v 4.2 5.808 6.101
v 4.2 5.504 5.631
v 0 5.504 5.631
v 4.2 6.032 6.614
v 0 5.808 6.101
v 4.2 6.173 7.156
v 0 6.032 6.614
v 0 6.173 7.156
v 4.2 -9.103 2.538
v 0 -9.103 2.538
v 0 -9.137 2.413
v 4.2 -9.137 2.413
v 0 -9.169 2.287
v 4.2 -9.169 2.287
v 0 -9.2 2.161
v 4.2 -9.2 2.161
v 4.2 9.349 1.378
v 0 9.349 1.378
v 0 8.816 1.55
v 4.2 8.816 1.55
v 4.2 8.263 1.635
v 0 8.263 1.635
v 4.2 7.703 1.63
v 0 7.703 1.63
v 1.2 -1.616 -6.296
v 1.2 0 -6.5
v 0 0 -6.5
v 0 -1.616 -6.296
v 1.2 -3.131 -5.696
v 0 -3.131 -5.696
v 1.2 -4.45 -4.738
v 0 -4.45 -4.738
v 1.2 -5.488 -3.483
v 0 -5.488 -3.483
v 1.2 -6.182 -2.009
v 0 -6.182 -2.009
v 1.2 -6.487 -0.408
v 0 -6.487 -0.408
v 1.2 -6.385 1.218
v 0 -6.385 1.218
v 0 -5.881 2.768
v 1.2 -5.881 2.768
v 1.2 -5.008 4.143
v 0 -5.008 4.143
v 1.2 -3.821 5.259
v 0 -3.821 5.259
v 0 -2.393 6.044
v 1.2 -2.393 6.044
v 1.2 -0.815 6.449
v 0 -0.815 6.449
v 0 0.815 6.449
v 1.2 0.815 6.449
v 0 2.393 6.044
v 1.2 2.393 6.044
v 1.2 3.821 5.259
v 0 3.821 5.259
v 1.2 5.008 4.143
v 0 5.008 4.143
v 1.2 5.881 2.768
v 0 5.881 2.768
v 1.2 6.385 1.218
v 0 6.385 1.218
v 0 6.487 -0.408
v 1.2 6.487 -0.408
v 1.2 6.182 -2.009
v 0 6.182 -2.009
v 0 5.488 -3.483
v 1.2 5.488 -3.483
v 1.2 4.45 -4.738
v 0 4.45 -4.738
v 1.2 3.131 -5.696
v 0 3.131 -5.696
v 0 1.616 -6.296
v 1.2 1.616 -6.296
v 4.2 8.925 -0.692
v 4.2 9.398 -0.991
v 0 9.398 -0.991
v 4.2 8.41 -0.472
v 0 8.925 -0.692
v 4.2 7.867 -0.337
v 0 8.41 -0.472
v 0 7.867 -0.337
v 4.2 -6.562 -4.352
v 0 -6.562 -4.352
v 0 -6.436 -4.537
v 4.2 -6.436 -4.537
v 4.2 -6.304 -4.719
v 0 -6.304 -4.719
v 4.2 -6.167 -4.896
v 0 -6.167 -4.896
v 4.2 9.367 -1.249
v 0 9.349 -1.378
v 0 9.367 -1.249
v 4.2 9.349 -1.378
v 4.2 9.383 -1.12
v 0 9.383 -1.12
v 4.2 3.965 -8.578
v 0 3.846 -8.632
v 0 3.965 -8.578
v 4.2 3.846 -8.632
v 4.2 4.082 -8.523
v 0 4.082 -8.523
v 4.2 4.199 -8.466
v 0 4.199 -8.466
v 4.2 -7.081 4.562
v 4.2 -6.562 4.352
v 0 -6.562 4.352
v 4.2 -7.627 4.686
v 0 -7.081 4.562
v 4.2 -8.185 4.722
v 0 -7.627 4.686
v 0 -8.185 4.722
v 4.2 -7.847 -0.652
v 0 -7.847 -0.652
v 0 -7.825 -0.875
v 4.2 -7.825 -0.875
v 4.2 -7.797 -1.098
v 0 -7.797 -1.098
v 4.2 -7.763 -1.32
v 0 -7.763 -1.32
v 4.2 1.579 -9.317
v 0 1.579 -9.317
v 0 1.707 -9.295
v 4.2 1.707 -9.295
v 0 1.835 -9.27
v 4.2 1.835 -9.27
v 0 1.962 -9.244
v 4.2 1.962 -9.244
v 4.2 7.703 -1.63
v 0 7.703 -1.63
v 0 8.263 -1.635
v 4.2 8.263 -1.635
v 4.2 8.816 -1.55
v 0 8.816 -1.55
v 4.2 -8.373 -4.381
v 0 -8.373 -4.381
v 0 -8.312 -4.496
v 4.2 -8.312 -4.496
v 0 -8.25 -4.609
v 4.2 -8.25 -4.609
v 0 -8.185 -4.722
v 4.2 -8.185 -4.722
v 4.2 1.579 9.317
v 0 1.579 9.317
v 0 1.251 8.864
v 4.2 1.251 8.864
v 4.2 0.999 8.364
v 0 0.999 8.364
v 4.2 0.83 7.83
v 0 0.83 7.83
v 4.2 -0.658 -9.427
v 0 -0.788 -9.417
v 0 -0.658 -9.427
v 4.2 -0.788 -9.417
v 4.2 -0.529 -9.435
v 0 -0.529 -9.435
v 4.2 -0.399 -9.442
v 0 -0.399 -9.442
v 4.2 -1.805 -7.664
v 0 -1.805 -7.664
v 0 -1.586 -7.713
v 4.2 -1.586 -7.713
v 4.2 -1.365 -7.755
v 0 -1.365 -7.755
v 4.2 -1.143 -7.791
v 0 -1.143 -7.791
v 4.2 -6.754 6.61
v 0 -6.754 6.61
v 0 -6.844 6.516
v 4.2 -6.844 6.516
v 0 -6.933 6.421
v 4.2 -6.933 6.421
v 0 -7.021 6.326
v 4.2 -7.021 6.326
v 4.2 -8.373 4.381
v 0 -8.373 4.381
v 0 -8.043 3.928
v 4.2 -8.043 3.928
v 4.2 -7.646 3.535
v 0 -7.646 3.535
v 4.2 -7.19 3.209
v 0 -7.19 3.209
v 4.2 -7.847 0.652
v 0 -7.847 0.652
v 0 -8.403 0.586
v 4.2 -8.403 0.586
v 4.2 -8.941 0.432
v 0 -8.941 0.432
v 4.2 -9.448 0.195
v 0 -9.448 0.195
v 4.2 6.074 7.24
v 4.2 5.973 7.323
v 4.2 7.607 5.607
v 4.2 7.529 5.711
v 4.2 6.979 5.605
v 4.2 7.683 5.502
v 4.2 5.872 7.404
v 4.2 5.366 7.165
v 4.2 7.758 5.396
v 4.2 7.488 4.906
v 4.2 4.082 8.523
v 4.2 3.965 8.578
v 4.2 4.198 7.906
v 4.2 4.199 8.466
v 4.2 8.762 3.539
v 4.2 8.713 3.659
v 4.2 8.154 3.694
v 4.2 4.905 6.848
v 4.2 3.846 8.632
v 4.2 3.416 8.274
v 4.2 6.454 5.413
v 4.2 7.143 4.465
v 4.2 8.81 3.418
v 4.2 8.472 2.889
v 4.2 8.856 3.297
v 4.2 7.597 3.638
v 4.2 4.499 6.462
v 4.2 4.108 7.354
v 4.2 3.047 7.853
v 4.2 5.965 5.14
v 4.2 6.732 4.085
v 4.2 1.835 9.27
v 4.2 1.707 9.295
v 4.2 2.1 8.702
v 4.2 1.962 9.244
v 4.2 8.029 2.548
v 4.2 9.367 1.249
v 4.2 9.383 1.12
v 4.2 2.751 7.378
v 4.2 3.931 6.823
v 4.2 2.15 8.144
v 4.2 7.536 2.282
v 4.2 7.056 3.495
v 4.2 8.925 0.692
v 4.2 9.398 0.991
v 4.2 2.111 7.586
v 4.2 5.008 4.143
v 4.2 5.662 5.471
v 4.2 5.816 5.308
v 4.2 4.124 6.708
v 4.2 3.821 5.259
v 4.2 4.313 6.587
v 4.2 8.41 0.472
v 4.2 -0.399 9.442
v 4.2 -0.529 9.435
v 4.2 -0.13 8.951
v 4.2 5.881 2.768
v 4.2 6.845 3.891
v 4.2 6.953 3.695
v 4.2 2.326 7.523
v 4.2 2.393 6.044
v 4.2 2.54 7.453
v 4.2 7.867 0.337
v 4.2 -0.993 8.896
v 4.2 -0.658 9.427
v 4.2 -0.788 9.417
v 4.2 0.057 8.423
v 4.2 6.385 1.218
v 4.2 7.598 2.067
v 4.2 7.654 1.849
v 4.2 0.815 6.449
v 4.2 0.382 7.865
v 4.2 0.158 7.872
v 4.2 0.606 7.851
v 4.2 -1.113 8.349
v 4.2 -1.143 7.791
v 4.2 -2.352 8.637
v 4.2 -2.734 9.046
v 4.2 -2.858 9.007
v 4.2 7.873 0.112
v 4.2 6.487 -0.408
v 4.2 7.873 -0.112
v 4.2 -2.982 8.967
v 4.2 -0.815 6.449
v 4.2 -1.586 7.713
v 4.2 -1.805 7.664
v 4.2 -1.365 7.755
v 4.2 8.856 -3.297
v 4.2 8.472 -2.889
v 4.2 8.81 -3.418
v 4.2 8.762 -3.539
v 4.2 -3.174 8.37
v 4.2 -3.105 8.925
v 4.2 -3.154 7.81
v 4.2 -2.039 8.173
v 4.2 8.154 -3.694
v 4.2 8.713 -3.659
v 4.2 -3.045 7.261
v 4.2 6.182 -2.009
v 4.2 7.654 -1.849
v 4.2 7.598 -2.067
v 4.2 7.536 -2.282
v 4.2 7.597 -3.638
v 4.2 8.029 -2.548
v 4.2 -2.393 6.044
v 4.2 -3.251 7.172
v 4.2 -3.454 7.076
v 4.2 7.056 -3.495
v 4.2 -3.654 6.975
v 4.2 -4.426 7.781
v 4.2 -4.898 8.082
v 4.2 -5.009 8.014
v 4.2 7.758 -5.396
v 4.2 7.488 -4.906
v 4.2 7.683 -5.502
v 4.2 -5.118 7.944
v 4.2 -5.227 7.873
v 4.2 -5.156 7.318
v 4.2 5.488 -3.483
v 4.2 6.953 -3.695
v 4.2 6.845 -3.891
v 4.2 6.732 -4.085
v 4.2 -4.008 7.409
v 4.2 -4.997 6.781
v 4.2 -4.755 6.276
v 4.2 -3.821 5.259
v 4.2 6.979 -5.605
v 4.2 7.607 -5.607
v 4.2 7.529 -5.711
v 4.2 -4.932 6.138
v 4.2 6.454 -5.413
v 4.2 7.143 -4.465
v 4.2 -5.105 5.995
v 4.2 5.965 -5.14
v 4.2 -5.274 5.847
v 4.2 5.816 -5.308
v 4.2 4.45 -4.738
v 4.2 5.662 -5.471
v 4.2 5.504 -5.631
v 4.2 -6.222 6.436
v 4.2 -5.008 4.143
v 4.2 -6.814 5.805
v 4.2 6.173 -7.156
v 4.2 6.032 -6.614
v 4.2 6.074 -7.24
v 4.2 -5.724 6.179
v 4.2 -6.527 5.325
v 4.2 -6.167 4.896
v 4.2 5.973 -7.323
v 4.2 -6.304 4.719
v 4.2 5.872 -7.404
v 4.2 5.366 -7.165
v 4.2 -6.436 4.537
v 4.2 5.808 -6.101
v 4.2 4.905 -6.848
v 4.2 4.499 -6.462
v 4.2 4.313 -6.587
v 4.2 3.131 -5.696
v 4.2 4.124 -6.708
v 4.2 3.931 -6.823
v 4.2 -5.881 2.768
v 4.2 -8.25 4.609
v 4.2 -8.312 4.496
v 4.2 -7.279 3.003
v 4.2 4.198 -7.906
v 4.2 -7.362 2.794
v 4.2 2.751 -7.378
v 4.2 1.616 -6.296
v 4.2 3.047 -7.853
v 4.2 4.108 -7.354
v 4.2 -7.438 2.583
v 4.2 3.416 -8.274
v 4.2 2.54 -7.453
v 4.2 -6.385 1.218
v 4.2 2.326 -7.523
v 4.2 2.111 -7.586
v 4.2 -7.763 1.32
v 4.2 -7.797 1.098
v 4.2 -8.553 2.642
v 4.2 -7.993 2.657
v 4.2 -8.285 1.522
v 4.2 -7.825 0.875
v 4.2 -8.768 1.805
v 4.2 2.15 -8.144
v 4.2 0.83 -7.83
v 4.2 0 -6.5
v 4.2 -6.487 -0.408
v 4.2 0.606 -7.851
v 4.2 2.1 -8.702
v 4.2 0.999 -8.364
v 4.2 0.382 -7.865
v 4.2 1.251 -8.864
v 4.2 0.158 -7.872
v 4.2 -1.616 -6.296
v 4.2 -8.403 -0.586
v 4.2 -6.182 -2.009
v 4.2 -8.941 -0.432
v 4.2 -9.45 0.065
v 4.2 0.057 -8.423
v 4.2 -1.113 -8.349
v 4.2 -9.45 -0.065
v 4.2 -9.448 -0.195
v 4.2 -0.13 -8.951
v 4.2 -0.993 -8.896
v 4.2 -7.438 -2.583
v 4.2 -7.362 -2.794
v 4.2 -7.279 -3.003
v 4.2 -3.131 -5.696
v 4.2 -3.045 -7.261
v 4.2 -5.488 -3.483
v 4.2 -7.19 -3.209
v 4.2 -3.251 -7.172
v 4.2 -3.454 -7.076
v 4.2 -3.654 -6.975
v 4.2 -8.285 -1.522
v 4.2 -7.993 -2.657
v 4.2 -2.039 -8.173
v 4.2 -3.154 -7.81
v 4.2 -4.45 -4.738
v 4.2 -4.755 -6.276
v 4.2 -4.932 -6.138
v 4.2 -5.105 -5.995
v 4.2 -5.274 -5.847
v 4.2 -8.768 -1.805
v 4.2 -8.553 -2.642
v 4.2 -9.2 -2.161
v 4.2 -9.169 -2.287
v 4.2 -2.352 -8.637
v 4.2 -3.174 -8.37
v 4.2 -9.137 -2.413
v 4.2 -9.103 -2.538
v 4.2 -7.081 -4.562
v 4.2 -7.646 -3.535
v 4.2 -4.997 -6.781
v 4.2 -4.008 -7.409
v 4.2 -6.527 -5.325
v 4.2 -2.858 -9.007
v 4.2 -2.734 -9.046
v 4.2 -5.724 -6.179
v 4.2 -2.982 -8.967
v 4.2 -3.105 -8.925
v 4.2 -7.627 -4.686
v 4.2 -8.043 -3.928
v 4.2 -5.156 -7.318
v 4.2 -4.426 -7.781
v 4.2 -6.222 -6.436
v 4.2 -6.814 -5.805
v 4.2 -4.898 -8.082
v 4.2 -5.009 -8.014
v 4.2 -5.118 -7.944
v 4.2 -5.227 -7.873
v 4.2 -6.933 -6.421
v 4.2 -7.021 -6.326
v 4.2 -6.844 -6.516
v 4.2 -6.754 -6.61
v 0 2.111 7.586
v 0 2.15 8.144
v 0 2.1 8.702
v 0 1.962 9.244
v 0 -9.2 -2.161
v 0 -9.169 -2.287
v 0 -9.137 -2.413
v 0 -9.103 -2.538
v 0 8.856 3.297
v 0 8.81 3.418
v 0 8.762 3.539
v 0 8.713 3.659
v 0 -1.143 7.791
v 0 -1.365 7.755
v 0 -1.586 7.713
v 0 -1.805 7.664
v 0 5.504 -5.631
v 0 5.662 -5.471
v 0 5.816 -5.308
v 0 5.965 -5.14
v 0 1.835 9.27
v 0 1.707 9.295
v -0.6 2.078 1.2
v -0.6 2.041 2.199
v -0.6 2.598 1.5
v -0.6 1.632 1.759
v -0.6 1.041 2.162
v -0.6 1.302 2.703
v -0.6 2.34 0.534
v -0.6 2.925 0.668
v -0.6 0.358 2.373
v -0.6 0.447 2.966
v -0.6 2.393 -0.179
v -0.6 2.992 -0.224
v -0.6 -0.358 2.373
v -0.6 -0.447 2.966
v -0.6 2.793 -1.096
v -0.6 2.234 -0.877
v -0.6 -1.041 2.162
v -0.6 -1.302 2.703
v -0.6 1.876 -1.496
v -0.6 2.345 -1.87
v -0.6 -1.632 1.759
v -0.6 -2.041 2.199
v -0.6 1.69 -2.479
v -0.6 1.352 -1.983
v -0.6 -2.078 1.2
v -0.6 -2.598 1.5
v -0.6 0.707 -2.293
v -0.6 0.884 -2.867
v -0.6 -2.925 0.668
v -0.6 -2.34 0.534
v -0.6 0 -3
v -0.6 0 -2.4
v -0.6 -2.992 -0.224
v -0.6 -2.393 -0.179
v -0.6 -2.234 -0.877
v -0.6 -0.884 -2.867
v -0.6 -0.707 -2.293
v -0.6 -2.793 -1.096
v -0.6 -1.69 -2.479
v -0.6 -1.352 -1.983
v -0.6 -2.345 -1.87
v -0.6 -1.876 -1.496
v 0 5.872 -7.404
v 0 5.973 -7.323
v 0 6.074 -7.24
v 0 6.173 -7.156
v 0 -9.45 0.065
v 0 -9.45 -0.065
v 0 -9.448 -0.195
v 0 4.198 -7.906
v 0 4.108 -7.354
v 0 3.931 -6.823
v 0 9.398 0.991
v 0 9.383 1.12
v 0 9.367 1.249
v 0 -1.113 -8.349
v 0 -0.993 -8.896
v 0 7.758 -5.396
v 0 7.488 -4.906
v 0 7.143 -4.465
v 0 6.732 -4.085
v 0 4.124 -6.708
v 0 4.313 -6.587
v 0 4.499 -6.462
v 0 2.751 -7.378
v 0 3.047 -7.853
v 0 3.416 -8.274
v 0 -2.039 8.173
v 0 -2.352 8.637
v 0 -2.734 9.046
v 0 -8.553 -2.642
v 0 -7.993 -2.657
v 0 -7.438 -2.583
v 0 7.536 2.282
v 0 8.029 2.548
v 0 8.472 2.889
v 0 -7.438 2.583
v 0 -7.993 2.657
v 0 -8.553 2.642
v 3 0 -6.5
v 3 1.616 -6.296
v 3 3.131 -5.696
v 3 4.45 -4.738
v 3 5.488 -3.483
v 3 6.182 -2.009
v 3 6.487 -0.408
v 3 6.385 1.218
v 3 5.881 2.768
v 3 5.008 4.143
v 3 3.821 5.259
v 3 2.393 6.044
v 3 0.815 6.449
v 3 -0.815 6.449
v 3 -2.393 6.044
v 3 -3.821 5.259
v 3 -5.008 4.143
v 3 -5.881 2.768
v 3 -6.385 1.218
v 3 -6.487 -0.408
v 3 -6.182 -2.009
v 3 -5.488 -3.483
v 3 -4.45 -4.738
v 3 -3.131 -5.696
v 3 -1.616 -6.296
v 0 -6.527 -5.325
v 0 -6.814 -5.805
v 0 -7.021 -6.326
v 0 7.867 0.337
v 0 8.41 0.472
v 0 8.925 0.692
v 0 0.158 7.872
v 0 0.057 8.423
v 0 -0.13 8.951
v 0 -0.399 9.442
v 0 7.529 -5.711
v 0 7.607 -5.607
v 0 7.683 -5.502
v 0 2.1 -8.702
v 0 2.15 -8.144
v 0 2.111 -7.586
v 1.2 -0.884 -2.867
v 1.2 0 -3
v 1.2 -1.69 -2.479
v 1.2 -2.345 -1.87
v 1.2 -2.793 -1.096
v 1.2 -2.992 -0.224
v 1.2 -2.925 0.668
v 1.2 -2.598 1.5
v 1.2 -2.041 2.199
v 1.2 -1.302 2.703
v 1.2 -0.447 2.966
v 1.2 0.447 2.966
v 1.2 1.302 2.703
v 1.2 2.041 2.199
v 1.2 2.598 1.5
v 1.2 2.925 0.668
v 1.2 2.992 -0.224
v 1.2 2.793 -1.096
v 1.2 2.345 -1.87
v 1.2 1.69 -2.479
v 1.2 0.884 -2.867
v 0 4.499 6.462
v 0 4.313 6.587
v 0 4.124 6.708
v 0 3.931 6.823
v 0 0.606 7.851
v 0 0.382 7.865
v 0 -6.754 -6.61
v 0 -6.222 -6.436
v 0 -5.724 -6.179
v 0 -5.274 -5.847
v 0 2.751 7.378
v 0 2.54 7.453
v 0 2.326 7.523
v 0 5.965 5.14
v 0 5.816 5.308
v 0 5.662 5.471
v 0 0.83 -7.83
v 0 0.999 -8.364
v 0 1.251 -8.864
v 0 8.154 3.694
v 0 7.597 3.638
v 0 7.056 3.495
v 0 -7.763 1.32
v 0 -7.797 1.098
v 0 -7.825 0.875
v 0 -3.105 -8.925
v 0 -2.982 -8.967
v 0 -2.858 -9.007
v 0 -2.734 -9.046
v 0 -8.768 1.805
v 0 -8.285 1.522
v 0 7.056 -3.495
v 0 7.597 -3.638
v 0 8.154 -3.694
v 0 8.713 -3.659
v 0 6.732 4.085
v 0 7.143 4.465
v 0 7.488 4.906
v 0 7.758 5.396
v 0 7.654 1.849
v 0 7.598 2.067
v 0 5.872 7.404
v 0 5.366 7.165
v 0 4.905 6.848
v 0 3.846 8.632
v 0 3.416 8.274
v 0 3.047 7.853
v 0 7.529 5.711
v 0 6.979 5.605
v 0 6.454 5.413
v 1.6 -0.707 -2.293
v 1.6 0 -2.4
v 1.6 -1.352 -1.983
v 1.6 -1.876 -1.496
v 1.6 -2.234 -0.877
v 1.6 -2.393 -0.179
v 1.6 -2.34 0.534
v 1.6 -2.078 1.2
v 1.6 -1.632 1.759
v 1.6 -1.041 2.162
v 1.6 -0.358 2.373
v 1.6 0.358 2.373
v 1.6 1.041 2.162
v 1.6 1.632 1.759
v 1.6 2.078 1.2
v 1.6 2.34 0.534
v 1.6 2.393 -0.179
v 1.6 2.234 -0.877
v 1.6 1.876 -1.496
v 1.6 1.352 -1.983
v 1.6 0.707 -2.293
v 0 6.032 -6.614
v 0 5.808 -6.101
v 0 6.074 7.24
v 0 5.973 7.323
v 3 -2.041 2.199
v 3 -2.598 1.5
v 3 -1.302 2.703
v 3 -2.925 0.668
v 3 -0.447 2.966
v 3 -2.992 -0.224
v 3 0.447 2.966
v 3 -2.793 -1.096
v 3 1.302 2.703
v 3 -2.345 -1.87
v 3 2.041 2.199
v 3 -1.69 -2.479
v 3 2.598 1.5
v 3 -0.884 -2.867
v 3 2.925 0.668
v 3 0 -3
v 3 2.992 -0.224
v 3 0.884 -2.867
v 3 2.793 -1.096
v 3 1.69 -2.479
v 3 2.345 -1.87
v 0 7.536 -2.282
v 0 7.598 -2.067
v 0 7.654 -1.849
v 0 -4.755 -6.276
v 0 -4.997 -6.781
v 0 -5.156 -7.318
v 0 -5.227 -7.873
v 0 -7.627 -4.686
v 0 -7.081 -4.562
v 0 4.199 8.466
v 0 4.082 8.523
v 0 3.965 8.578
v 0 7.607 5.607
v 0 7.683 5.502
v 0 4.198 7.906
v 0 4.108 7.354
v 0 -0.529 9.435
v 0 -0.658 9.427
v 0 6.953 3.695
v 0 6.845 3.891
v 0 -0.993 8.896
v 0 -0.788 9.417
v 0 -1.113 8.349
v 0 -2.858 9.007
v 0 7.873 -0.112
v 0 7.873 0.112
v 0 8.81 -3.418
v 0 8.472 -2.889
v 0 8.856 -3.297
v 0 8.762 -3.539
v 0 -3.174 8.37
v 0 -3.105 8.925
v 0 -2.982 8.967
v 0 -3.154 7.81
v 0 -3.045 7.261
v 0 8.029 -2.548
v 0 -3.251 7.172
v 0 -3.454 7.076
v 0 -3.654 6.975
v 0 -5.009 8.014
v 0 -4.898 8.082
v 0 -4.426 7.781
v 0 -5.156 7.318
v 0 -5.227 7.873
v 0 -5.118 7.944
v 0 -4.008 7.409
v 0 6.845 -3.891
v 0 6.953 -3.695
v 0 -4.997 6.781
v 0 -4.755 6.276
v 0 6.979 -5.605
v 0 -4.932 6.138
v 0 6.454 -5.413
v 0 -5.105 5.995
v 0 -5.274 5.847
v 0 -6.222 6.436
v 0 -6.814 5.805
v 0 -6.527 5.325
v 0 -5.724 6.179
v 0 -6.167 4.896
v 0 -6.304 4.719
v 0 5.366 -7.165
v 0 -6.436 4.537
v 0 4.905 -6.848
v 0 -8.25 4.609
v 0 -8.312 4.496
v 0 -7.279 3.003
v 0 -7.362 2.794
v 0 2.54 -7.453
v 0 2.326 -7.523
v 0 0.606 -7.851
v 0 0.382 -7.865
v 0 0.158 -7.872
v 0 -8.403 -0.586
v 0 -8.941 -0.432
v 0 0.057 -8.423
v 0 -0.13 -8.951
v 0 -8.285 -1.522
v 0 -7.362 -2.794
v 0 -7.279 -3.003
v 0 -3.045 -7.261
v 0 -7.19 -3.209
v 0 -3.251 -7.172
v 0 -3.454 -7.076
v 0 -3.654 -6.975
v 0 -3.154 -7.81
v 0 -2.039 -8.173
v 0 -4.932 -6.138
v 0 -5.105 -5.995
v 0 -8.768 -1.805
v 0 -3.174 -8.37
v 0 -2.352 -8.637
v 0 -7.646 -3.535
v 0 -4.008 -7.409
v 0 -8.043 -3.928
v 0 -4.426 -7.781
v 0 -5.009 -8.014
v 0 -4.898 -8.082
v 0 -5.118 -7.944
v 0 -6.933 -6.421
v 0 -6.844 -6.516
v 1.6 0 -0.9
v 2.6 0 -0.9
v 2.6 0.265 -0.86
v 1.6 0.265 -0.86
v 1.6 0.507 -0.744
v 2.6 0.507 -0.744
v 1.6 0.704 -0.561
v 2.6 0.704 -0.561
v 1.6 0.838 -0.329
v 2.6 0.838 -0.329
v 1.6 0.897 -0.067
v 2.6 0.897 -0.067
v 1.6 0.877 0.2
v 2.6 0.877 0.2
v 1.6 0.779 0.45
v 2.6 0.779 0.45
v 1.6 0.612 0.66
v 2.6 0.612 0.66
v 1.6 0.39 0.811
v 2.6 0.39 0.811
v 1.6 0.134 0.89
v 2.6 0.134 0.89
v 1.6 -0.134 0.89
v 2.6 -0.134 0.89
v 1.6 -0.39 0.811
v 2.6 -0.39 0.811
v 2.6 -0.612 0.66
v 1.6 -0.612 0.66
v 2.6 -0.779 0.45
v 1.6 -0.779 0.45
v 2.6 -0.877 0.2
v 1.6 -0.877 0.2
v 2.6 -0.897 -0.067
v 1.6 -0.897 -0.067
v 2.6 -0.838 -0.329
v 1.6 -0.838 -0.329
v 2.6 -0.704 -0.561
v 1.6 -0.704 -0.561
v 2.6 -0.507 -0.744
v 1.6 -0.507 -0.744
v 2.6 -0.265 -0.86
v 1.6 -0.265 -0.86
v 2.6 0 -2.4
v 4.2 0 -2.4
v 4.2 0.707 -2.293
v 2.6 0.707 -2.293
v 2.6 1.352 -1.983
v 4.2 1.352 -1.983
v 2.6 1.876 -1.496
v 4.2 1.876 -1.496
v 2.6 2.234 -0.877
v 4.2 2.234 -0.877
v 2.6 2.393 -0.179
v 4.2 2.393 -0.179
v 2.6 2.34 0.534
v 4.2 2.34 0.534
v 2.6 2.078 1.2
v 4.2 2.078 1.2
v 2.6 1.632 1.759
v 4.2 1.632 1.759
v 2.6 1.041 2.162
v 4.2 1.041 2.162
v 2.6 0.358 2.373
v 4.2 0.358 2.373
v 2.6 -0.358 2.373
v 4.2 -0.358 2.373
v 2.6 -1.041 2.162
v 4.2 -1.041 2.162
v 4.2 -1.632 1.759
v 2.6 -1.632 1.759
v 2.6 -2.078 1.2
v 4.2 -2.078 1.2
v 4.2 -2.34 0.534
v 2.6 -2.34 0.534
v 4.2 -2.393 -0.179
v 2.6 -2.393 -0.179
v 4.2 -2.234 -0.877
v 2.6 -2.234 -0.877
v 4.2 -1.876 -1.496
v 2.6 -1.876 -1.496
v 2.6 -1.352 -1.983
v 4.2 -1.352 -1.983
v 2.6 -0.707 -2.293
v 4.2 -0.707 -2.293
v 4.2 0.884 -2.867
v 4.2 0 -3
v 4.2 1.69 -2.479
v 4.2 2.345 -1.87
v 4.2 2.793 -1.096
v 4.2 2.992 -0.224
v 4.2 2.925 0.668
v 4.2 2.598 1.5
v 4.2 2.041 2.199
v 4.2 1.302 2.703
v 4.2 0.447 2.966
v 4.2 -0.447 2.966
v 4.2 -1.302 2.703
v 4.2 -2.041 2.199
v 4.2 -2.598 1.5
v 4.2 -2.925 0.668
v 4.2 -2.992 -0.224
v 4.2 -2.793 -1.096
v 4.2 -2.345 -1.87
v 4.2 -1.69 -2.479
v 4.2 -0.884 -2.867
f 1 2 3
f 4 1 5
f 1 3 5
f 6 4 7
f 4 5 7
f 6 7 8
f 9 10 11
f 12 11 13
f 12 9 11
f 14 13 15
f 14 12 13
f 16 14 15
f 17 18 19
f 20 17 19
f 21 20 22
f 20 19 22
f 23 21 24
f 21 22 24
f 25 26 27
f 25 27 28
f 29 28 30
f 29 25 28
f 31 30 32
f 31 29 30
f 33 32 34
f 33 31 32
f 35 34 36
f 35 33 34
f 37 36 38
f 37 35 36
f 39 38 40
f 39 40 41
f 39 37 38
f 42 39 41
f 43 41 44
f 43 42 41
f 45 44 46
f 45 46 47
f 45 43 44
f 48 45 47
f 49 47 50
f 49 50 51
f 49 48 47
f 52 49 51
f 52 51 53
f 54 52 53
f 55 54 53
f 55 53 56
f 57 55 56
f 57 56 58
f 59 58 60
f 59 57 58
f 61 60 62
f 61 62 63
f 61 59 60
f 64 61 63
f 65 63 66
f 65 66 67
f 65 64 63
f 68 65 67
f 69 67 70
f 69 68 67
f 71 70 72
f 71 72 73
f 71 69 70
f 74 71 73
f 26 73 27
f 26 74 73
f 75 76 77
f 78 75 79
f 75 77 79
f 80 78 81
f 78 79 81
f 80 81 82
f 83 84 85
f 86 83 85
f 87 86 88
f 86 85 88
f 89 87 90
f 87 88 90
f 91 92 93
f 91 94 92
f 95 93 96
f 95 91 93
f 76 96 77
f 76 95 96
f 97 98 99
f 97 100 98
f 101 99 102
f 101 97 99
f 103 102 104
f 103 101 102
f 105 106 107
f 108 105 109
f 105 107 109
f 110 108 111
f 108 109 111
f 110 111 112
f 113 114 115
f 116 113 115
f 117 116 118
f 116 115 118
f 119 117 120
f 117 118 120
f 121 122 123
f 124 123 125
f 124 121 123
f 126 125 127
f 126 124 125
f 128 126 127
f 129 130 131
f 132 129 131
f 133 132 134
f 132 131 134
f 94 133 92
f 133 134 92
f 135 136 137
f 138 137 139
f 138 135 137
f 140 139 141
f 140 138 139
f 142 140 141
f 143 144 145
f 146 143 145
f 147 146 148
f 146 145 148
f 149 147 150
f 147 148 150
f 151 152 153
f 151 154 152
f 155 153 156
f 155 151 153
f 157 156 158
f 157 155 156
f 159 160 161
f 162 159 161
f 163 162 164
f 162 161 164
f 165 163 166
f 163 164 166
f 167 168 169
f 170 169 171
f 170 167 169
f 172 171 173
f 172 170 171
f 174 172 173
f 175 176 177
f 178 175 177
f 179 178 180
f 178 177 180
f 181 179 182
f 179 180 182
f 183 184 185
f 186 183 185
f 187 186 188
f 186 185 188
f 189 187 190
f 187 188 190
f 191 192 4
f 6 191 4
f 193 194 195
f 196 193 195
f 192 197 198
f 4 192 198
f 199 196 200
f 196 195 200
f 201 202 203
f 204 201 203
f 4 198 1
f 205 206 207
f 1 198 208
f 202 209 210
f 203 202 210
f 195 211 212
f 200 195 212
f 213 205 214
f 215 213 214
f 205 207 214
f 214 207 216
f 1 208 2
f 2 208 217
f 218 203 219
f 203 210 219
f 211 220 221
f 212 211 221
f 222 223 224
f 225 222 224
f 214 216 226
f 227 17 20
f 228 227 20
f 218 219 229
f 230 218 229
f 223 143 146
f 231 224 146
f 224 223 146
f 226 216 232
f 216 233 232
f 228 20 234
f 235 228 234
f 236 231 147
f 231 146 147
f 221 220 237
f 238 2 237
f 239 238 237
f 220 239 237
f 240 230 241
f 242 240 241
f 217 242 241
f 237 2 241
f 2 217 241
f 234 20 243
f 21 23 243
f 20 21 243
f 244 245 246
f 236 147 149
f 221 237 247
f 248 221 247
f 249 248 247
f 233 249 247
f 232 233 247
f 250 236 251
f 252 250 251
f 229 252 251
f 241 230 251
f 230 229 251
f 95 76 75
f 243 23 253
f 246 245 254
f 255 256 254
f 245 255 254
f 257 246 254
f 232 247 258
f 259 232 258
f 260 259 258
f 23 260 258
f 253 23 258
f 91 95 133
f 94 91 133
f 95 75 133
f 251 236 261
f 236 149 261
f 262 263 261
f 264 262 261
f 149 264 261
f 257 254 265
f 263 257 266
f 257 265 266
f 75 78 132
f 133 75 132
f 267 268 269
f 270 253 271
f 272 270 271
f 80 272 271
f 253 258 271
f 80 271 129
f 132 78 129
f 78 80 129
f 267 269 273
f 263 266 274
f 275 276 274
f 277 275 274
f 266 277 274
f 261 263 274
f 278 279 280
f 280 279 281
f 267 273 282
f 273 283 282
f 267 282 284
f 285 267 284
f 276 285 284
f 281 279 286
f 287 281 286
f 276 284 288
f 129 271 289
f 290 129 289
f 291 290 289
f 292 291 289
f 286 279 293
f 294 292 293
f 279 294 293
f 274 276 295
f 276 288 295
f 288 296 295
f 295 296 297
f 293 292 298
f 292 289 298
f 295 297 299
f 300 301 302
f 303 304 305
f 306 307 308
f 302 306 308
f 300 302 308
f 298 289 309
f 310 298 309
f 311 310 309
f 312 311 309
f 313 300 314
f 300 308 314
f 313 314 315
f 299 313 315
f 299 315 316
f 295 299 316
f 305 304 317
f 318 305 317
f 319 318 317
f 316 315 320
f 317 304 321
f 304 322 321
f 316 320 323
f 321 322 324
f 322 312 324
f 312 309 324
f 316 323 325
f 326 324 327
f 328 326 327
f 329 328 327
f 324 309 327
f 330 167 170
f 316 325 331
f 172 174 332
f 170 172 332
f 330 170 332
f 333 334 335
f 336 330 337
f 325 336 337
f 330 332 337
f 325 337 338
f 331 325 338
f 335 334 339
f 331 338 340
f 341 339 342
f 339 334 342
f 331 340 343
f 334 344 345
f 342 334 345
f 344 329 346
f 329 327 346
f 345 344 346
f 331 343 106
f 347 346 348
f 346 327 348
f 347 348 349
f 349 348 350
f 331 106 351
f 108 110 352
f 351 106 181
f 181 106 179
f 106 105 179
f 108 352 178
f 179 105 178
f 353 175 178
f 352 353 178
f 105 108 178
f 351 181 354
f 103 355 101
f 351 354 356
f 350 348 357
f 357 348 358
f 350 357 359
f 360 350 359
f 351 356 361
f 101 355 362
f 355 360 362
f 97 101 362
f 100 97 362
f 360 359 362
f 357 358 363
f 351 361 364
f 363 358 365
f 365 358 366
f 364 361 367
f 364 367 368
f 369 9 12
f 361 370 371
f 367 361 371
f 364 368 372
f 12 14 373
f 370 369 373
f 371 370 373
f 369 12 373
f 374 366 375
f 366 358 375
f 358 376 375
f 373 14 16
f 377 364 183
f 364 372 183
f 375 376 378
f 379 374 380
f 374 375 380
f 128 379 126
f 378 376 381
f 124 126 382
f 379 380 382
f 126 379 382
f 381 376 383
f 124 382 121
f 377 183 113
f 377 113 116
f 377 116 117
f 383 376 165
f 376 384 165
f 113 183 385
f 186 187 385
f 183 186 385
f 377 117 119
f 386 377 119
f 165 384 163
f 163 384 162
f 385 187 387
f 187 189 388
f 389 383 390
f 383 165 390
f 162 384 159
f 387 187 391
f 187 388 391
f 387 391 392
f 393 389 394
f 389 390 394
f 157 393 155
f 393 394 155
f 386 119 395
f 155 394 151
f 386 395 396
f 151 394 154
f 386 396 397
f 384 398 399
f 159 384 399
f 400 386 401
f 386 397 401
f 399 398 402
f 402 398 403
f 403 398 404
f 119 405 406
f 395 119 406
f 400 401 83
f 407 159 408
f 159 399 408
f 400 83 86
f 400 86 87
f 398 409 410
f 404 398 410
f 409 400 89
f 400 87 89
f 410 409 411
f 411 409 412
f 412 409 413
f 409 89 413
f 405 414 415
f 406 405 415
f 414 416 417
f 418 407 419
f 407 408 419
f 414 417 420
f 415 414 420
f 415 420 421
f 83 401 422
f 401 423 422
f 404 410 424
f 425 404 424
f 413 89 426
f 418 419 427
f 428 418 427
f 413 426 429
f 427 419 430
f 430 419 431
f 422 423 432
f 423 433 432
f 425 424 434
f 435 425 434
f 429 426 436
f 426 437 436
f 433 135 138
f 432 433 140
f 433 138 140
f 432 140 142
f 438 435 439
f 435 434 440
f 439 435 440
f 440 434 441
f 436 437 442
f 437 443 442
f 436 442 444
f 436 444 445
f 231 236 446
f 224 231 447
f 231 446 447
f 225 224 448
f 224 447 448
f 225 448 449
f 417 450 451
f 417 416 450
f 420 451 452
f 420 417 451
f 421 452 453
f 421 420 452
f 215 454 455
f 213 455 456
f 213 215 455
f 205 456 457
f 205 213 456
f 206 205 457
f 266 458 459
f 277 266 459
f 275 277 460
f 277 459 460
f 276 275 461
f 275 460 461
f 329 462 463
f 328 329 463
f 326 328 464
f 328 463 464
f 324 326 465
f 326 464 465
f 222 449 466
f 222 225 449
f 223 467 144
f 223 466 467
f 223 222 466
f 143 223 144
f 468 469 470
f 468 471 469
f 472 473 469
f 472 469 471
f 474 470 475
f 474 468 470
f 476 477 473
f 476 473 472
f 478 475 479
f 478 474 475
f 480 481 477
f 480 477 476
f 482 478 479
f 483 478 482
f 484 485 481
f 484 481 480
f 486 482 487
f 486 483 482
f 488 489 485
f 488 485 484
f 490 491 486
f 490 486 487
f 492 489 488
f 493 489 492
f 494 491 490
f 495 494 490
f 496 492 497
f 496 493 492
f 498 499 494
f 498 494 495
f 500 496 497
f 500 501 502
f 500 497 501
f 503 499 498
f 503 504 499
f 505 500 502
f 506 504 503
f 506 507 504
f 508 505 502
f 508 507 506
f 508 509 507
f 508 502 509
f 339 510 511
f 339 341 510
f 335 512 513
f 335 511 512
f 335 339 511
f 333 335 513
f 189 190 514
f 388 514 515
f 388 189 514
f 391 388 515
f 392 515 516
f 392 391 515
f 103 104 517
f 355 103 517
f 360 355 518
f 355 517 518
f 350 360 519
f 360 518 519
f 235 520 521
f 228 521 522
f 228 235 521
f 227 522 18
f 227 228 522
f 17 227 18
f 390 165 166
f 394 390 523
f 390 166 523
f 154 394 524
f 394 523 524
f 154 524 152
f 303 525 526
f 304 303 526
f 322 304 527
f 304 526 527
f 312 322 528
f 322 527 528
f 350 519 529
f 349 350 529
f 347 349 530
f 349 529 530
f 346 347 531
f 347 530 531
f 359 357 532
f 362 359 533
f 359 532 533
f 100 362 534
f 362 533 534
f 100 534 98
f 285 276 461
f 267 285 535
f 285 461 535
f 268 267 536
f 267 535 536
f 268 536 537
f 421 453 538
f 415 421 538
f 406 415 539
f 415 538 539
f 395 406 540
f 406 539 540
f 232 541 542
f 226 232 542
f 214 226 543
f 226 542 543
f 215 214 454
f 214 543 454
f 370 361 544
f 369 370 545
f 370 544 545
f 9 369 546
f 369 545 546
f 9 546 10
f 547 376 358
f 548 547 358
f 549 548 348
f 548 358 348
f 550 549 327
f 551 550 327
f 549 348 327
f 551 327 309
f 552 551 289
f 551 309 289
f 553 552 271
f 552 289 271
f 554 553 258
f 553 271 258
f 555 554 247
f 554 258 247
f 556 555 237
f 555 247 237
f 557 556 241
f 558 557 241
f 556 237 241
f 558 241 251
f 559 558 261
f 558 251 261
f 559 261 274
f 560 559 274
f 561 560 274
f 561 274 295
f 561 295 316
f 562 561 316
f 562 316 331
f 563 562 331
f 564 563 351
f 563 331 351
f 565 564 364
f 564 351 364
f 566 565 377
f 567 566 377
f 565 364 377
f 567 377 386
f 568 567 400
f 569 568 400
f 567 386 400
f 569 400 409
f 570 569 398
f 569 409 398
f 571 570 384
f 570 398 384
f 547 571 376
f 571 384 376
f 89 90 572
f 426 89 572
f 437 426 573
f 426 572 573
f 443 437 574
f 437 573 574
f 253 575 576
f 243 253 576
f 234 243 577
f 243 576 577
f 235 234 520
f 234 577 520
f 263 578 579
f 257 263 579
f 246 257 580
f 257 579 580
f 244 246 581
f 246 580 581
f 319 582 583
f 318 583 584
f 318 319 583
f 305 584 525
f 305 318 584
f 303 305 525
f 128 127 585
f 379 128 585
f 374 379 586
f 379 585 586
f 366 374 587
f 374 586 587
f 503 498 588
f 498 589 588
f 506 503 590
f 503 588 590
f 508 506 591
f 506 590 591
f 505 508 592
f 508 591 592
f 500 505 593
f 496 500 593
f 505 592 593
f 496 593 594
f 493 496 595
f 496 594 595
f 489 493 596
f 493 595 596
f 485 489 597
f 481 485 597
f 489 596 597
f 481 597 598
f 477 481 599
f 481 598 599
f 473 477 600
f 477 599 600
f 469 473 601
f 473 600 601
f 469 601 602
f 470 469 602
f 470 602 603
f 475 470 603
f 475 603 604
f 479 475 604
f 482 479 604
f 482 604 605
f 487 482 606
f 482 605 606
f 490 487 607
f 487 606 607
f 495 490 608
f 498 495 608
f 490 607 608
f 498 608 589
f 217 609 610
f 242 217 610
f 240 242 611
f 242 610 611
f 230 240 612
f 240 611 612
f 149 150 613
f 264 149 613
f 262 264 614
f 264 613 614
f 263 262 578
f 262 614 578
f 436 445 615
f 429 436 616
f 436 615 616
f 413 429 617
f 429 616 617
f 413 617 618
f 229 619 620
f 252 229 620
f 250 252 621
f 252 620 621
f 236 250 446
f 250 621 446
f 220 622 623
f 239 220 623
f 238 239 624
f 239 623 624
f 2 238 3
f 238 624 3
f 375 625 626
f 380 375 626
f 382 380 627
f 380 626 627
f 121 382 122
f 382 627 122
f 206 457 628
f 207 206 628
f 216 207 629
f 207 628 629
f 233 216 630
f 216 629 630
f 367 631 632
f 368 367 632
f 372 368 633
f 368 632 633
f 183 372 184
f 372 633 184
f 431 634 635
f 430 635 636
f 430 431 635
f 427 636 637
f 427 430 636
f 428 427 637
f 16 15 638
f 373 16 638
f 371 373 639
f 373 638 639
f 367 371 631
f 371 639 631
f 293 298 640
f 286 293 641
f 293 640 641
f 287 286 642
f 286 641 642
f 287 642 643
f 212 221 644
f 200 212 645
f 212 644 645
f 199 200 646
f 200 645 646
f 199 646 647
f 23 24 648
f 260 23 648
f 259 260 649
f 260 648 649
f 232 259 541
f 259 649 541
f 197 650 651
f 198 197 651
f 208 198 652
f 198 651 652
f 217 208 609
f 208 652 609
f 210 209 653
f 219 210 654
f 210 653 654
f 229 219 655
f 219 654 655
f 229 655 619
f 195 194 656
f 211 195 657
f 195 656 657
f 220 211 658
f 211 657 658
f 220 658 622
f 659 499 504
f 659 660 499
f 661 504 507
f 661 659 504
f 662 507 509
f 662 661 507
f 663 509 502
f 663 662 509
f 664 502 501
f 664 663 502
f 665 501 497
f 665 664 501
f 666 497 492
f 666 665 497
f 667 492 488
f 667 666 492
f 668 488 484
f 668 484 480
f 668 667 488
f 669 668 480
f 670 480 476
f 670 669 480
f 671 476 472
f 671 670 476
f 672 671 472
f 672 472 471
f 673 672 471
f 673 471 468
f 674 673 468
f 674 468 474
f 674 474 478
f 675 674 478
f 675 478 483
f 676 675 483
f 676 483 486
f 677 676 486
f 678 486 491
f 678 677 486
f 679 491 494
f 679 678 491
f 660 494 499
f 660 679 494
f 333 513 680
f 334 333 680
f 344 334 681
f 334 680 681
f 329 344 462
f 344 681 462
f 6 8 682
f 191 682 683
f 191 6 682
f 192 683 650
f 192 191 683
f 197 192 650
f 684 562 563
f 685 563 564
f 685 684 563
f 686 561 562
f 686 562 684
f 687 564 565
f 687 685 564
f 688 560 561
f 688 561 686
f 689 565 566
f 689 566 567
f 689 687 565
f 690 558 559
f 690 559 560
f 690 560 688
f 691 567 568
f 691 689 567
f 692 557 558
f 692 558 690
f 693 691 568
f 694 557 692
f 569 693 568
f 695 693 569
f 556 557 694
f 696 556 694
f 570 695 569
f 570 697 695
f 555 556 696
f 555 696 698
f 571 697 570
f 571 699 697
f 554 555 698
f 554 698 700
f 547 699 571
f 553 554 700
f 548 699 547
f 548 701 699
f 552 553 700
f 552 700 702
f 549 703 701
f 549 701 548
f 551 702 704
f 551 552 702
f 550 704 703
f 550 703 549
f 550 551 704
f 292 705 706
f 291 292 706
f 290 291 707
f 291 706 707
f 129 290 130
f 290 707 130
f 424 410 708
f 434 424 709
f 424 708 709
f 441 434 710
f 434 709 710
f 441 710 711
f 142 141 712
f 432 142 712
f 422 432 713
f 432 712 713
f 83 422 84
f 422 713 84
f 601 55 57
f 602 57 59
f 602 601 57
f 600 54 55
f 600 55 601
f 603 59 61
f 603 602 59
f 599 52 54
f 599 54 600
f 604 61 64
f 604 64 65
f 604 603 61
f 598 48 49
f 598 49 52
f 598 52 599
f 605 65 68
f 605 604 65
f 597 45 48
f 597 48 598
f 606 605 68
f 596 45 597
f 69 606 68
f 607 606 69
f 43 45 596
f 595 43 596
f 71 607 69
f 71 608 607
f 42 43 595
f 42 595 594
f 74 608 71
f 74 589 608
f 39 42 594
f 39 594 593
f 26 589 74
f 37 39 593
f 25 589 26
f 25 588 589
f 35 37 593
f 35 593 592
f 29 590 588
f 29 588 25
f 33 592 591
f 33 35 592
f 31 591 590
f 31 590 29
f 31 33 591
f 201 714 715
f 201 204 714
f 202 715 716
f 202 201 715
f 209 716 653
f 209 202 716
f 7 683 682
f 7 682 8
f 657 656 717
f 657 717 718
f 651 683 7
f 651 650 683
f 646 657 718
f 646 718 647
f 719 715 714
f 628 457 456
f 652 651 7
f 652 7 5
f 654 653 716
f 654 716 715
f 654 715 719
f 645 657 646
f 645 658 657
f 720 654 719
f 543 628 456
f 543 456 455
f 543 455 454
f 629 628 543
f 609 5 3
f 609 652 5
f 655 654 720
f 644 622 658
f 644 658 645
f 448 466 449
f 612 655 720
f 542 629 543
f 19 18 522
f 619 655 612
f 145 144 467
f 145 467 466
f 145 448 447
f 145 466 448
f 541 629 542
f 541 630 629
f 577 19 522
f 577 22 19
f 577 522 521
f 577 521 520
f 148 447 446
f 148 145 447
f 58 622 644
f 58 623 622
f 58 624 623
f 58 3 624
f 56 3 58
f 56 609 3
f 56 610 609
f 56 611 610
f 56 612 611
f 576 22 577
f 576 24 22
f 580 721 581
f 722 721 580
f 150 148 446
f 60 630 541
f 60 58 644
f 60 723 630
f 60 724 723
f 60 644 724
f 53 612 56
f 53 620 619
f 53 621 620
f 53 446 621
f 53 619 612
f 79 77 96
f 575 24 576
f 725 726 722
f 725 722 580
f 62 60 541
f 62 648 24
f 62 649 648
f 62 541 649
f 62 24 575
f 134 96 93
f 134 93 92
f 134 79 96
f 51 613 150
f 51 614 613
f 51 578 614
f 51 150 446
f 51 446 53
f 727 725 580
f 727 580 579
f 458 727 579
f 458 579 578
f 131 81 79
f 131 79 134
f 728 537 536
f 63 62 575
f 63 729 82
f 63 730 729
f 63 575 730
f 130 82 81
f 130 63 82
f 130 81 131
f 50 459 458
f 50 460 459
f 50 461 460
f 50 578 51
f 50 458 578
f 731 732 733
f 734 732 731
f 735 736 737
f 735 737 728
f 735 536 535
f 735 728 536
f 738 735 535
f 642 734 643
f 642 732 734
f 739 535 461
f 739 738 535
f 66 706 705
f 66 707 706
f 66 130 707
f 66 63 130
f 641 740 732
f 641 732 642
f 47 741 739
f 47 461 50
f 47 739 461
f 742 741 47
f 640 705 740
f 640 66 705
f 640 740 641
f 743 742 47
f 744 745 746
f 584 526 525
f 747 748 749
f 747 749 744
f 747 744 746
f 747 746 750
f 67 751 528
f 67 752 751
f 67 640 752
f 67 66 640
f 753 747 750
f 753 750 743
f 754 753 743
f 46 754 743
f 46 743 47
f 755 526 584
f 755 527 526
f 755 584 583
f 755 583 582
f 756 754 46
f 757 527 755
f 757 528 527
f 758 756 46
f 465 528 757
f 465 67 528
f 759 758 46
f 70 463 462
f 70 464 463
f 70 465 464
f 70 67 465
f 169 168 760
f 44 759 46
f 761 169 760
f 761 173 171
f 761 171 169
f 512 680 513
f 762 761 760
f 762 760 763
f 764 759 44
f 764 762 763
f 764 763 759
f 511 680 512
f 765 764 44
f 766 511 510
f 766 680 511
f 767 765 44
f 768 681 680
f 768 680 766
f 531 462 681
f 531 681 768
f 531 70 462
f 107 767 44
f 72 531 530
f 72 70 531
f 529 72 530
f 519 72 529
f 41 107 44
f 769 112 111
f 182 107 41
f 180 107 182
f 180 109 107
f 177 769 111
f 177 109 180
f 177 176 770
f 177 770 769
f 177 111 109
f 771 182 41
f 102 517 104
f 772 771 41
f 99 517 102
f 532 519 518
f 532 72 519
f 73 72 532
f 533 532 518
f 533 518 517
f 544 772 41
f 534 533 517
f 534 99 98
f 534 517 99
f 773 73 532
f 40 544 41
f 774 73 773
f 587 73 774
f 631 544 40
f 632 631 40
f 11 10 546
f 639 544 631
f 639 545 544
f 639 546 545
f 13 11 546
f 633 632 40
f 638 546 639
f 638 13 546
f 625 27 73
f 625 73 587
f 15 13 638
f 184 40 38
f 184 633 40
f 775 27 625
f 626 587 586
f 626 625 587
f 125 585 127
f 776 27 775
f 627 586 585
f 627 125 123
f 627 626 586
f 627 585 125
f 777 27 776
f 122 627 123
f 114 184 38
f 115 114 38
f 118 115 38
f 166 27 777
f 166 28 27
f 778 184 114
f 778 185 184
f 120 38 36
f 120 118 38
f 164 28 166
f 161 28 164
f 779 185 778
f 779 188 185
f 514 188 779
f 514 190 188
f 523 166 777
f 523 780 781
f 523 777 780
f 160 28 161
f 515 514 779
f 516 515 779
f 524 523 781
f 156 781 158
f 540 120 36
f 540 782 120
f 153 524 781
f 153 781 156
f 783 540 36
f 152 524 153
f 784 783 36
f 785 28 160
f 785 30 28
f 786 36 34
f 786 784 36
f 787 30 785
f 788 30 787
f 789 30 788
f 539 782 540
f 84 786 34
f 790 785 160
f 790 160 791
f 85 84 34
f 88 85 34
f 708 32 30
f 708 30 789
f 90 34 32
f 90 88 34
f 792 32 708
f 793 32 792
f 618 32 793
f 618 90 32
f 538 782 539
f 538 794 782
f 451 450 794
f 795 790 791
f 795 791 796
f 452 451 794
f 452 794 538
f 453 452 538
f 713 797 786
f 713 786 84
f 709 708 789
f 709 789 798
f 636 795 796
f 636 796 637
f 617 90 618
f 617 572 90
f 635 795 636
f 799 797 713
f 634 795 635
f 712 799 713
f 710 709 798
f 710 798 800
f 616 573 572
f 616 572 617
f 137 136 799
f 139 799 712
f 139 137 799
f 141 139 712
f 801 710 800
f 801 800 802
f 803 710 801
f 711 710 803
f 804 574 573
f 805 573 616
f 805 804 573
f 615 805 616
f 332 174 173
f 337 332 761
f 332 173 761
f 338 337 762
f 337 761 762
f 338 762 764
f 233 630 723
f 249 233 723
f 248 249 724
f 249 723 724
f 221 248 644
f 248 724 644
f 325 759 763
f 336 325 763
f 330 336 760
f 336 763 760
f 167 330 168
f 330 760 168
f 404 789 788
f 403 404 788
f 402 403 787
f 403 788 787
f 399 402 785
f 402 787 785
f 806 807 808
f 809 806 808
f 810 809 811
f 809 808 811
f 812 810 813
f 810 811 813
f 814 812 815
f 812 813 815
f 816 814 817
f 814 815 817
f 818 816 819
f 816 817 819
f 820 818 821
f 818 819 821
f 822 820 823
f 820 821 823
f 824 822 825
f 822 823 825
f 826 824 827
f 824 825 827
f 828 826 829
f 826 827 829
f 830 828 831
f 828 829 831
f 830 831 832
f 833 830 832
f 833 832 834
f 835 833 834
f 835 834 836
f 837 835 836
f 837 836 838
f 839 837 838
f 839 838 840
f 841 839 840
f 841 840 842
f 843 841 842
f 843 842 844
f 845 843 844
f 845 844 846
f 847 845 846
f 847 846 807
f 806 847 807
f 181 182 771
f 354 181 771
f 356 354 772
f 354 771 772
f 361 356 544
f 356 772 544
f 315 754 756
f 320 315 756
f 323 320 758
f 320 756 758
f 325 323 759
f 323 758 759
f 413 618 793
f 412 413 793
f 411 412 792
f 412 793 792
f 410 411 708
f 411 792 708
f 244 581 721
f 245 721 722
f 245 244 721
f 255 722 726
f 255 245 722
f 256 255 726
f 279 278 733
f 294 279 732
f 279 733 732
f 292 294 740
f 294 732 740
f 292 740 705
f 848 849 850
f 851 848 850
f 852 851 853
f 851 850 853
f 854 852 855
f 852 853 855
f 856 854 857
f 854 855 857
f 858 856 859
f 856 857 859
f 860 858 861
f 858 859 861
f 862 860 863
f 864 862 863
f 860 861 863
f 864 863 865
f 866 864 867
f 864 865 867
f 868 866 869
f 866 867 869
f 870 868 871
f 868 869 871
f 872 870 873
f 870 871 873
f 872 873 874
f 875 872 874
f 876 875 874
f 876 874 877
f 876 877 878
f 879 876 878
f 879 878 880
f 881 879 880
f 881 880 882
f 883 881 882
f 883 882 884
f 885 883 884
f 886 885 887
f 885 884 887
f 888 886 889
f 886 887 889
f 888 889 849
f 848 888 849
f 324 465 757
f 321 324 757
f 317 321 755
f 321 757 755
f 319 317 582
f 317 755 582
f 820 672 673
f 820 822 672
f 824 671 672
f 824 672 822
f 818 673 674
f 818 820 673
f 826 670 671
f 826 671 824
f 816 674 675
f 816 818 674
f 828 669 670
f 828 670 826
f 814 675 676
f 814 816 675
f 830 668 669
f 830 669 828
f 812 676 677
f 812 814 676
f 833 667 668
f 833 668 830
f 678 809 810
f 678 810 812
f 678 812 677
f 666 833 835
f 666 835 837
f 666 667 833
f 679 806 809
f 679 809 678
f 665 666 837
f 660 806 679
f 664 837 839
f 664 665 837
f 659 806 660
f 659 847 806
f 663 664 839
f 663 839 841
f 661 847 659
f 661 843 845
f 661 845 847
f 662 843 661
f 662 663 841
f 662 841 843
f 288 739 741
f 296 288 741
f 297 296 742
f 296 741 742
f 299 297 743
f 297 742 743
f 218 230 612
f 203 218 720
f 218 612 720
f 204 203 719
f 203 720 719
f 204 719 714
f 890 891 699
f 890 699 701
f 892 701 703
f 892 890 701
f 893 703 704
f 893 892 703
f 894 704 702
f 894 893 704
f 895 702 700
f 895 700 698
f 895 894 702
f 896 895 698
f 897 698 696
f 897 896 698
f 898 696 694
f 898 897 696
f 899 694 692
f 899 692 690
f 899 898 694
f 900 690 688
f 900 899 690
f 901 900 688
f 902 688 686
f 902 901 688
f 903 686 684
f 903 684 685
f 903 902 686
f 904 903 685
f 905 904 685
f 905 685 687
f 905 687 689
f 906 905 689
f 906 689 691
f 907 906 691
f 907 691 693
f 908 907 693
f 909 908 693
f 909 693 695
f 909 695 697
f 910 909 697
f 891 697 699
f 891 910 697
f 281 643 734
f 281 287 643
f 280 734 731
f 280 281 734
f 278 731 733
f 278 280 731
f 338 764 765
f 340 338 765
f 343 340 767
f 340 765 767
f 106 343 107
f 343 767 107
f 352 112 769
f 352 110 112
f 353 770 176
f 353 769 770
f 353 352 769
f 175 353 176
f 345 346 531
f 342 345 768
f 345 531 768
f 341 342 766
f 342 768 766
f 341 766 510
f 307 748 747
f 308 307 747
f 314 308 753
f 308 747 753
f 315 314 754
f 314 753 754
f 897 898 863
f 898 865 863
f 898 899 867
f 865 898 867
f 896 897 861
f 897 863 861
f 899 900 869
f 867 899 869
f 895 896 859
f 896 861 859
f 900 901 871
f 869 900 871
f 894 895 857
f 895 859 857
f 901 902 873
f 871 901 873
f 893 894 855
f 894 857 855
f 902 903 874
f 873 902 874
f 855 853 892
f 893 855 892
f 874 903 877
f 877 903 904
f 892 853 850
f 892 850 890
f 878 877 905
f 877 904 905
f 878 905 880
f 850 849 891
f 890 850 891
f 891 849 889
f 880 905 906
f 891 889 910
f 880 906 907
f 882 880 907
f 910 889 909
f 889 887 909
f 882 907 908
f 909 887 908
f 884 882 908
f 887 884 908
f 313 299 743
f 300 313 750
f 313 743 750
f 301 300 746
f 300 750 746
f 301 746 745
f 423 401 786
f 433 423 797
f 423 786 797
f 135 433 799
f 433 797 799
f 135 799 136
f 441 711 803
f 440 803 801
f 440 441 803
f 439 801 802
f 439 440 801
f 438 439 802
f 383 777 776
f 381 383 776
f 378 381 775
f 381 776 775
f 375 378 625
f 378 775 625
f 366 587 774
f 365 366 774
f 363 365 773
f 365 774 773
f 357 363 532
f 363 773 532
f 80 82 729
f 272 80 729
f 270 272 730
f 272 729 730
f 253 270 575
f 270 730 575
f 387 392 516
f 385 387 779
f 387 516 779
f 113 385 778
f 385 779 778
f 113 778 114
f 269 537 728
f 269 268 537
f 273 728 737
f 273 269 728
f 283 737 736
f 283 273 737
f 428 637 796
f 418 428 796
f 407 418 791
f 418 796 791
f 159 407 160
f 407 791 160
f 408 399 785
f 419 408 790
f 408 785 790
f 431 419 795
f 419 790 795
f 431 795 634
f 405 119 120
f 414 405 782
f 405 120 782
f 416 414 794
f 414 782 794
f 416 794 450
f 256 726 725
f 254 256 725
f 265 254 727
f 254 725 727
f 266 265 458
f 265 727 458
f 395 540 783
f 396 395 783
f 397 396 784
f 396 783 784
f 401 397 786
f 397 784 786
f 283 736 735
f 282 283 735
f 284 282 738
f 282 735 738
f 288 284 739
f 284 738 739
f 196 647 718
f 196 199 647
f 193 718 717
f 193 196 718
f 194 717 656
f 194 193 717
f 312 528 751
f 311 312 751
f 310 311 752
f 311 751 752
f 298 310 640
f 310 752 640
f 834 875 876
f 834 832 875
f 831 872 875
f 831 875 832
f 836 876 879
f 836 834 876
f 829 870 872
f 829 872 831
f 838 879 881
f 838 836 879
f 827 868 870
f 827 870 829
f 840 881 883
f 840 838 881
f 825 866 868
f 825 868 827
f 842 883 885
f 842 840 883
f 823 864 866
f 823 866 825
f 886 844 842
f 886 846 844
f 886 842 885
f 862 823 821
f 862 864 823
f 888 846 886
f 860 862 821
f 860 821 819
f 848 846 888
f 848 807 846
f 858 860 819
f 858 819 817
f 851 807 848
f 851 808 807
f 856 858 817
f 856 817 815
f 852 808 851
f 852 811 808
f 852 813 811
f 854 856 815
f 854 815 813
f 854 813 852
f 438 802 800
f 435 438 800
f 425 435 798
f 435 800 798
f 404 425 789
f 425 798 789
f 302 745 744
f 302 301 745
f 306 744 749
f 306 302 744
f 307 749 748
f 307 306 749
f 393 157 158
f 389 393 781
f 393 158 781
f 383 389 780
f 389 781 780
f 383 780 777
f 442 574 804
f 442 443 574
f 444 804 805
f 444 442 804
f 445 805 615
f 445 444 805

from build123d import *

# Parameters (mm, degrees)
BASPROSKE_W         = 4.2
BASPROSKE_H         = 9.45
TOOTHCUT_DEPTH      = 15.008747267
TEETHCUTS_COUNT     = 25
TEETHCUTS_ANGLE     = 345.6
SKETCH7_R           = 2.4
CUT_EXTRUDE2_DEPTH  = 1.6
SKETCH13_R          = 6.5
SKETCH13_R_2        = 3
CUT_EXTRUDE3_DEPTH  = 1.2
CUT_EXTRUDE4_START  = -1.2
SKETCH15_R          = 6.5
SKETCH15_R_2        = 3
CUT_EXTRUDE4_DEPTH  = 1.2
CUT_EXTRUDE5_START  = -1.6
SKETCH17_R          = 2.4
CUT_EXTRUDE5_DEPTH  = 1.6
SKETCH18_R          = 0.9
CUT_EXTRUDE6_DEPTH  = 1.6
SKETCH19_R          = 3
SKETCH19_R_2        = 2.4
BOSS_EXTRUDE1_DEPTH = 0.6


with BuildPart() as part:
    # BasProSke → Base-Revolve (revolve)
    with BuildSketch(Plane(origin=(0, 0, 0), x_dir=(1, 0, 0), z_dir=(0, 1, 0)), mode=Mode.PRIVATE) as base_revolve_sk:
        with Locations((2.1, 4.725)):
            Rectangle(BASPROSKE_W, BASPROSKE_H)
    revolve(base_revolve_sk.sketch.rotate(Axis((-10, 0, 0), (1, 0, 0)), 180), axis=Axis((-10, 0, 0), (1, 0, 0)))

    # TooCutSke → ToothCut (cut, through all)
    with BuildSketch(Plane(origin=(0, 0, 0), x_dir=(0, 0, -1), z_dir=(1, 0, 0))):
        with BuildLine():
            ThreePointArc((0.336642775, 7.866800343), (0, 7.874), (-0.336642775, 7.866800343))
            ThreePointArc((-0.336642775, 7.866800343), (-0.577188207, 8.685445672), (-1.008672355, 9.421559597))
            ThreePointArc((-1.008672355, 9.421559597), (0, 9.4754), (1.008672355, 9.421559597))
            ThreePointArc((1.008672355, 9.421559597), (0.577188207, 8.685445672), (0.336642775, 7.866800343))
        make_face()
    toothcut = extrude(amount=TOOTHCUT_DEPTH, mode=Mode.SUBTRACT)

    # TeethCuts: ToothCut ×25 about axis
    teethcuts_axis = Axis((-10, 0, 0), (1, 0, 0))
    for i in range(1, TEETHCUTS_COUNT):
        add(toothcut.rotate(teethcuts_axis, i * TEETHCUTS_ANGLE / (TEETHCUTS_COUNT - 1)), mode=Mode.SUBTRACT)

    # Sketch7 → Cut-Extrude2 (cut)
    with BuildSketch(Plane(origin=(4.2, 0, 0), x_dir=(0, 0, -1), z_dir=(1, 0, 0))):
        Circle(SKETCH7_R)
    extrude(amount=-CUT_EXTRUDE2_DEPTH, mode=Mode.SUBTRACT)

    # Sketch13 → Cut-Extrude3 (cut)
    with BuildSketch(Plane(origin=(4.2, 0, 0), x_dir=(0, 0, -1), z_dir=(1, 0, 0))):
        Circle(SKETCH13_R)
        Circle(SKETCH13_R_2, mode=Mode.SUBTRACT)
    extrude(amount=-CUT_EXTRUDE3_DEPTH, mode=Mode.SUBTRACT)

    # Sketch15 → Cut-Extrude4 (cut)
    with BuildSketch(Plane.ZY.offset(CUT_EXTRUDE4_START)):
        with Locations(Location((0, 0, 0), (0, 0, 180))):
            Circle(SKETCH15_R)
        with Locations(Location((0, 0, 0), (0, 0, 180))):
            Circle(SKETCH15_R_2, mode=Mode.SUBTRACT)
    extrude(amount=CUT_EXTRUDE4_DEPTH, mode=Mode.SUBTRACT)

    # Sketch17 → Cut-Extrude5 (cut)
    with BuildSketch(Plane.ZY.offset(CUT_EXTRUDE5_START)):
        with Locations(Location((0, 0, 0), (0, 0, 180))):
            Circle(SKETCH17_R)
    extrude(amount=CUT_EXTRUDE5_DEPTH, mode=Mode.SUBTRACT)

    # Sketch18 → Cut-Extrude6 (cut)
    with BuildSketch(Plane(origin=(2.6, 0, 0), x_dir=(0, 0, -1), z_dir=(1, 0, 0))):
        Circle(SKETCH18_R)
    extrude(amount=-CUT_EXTRUDE6_DEPTH, mode=Mode.SUBTRACT)

    # Sketch19 → Boss-Extrude1 (add)
    with BuildSketch(Plane.ZY):
        with Locations(Location((0, 0, 0), (0, 0, 180))):
            Circle(SKETCH19_R)
        with Locations(Location((0, 0, 0), (0, 0, 180))):
            Circle(SKETCH19_R_2, mode=Mode.SUBTRACT)
    extrude(amount=BOSS_EXTRUDE1_DEPTH)


solid = part.part
